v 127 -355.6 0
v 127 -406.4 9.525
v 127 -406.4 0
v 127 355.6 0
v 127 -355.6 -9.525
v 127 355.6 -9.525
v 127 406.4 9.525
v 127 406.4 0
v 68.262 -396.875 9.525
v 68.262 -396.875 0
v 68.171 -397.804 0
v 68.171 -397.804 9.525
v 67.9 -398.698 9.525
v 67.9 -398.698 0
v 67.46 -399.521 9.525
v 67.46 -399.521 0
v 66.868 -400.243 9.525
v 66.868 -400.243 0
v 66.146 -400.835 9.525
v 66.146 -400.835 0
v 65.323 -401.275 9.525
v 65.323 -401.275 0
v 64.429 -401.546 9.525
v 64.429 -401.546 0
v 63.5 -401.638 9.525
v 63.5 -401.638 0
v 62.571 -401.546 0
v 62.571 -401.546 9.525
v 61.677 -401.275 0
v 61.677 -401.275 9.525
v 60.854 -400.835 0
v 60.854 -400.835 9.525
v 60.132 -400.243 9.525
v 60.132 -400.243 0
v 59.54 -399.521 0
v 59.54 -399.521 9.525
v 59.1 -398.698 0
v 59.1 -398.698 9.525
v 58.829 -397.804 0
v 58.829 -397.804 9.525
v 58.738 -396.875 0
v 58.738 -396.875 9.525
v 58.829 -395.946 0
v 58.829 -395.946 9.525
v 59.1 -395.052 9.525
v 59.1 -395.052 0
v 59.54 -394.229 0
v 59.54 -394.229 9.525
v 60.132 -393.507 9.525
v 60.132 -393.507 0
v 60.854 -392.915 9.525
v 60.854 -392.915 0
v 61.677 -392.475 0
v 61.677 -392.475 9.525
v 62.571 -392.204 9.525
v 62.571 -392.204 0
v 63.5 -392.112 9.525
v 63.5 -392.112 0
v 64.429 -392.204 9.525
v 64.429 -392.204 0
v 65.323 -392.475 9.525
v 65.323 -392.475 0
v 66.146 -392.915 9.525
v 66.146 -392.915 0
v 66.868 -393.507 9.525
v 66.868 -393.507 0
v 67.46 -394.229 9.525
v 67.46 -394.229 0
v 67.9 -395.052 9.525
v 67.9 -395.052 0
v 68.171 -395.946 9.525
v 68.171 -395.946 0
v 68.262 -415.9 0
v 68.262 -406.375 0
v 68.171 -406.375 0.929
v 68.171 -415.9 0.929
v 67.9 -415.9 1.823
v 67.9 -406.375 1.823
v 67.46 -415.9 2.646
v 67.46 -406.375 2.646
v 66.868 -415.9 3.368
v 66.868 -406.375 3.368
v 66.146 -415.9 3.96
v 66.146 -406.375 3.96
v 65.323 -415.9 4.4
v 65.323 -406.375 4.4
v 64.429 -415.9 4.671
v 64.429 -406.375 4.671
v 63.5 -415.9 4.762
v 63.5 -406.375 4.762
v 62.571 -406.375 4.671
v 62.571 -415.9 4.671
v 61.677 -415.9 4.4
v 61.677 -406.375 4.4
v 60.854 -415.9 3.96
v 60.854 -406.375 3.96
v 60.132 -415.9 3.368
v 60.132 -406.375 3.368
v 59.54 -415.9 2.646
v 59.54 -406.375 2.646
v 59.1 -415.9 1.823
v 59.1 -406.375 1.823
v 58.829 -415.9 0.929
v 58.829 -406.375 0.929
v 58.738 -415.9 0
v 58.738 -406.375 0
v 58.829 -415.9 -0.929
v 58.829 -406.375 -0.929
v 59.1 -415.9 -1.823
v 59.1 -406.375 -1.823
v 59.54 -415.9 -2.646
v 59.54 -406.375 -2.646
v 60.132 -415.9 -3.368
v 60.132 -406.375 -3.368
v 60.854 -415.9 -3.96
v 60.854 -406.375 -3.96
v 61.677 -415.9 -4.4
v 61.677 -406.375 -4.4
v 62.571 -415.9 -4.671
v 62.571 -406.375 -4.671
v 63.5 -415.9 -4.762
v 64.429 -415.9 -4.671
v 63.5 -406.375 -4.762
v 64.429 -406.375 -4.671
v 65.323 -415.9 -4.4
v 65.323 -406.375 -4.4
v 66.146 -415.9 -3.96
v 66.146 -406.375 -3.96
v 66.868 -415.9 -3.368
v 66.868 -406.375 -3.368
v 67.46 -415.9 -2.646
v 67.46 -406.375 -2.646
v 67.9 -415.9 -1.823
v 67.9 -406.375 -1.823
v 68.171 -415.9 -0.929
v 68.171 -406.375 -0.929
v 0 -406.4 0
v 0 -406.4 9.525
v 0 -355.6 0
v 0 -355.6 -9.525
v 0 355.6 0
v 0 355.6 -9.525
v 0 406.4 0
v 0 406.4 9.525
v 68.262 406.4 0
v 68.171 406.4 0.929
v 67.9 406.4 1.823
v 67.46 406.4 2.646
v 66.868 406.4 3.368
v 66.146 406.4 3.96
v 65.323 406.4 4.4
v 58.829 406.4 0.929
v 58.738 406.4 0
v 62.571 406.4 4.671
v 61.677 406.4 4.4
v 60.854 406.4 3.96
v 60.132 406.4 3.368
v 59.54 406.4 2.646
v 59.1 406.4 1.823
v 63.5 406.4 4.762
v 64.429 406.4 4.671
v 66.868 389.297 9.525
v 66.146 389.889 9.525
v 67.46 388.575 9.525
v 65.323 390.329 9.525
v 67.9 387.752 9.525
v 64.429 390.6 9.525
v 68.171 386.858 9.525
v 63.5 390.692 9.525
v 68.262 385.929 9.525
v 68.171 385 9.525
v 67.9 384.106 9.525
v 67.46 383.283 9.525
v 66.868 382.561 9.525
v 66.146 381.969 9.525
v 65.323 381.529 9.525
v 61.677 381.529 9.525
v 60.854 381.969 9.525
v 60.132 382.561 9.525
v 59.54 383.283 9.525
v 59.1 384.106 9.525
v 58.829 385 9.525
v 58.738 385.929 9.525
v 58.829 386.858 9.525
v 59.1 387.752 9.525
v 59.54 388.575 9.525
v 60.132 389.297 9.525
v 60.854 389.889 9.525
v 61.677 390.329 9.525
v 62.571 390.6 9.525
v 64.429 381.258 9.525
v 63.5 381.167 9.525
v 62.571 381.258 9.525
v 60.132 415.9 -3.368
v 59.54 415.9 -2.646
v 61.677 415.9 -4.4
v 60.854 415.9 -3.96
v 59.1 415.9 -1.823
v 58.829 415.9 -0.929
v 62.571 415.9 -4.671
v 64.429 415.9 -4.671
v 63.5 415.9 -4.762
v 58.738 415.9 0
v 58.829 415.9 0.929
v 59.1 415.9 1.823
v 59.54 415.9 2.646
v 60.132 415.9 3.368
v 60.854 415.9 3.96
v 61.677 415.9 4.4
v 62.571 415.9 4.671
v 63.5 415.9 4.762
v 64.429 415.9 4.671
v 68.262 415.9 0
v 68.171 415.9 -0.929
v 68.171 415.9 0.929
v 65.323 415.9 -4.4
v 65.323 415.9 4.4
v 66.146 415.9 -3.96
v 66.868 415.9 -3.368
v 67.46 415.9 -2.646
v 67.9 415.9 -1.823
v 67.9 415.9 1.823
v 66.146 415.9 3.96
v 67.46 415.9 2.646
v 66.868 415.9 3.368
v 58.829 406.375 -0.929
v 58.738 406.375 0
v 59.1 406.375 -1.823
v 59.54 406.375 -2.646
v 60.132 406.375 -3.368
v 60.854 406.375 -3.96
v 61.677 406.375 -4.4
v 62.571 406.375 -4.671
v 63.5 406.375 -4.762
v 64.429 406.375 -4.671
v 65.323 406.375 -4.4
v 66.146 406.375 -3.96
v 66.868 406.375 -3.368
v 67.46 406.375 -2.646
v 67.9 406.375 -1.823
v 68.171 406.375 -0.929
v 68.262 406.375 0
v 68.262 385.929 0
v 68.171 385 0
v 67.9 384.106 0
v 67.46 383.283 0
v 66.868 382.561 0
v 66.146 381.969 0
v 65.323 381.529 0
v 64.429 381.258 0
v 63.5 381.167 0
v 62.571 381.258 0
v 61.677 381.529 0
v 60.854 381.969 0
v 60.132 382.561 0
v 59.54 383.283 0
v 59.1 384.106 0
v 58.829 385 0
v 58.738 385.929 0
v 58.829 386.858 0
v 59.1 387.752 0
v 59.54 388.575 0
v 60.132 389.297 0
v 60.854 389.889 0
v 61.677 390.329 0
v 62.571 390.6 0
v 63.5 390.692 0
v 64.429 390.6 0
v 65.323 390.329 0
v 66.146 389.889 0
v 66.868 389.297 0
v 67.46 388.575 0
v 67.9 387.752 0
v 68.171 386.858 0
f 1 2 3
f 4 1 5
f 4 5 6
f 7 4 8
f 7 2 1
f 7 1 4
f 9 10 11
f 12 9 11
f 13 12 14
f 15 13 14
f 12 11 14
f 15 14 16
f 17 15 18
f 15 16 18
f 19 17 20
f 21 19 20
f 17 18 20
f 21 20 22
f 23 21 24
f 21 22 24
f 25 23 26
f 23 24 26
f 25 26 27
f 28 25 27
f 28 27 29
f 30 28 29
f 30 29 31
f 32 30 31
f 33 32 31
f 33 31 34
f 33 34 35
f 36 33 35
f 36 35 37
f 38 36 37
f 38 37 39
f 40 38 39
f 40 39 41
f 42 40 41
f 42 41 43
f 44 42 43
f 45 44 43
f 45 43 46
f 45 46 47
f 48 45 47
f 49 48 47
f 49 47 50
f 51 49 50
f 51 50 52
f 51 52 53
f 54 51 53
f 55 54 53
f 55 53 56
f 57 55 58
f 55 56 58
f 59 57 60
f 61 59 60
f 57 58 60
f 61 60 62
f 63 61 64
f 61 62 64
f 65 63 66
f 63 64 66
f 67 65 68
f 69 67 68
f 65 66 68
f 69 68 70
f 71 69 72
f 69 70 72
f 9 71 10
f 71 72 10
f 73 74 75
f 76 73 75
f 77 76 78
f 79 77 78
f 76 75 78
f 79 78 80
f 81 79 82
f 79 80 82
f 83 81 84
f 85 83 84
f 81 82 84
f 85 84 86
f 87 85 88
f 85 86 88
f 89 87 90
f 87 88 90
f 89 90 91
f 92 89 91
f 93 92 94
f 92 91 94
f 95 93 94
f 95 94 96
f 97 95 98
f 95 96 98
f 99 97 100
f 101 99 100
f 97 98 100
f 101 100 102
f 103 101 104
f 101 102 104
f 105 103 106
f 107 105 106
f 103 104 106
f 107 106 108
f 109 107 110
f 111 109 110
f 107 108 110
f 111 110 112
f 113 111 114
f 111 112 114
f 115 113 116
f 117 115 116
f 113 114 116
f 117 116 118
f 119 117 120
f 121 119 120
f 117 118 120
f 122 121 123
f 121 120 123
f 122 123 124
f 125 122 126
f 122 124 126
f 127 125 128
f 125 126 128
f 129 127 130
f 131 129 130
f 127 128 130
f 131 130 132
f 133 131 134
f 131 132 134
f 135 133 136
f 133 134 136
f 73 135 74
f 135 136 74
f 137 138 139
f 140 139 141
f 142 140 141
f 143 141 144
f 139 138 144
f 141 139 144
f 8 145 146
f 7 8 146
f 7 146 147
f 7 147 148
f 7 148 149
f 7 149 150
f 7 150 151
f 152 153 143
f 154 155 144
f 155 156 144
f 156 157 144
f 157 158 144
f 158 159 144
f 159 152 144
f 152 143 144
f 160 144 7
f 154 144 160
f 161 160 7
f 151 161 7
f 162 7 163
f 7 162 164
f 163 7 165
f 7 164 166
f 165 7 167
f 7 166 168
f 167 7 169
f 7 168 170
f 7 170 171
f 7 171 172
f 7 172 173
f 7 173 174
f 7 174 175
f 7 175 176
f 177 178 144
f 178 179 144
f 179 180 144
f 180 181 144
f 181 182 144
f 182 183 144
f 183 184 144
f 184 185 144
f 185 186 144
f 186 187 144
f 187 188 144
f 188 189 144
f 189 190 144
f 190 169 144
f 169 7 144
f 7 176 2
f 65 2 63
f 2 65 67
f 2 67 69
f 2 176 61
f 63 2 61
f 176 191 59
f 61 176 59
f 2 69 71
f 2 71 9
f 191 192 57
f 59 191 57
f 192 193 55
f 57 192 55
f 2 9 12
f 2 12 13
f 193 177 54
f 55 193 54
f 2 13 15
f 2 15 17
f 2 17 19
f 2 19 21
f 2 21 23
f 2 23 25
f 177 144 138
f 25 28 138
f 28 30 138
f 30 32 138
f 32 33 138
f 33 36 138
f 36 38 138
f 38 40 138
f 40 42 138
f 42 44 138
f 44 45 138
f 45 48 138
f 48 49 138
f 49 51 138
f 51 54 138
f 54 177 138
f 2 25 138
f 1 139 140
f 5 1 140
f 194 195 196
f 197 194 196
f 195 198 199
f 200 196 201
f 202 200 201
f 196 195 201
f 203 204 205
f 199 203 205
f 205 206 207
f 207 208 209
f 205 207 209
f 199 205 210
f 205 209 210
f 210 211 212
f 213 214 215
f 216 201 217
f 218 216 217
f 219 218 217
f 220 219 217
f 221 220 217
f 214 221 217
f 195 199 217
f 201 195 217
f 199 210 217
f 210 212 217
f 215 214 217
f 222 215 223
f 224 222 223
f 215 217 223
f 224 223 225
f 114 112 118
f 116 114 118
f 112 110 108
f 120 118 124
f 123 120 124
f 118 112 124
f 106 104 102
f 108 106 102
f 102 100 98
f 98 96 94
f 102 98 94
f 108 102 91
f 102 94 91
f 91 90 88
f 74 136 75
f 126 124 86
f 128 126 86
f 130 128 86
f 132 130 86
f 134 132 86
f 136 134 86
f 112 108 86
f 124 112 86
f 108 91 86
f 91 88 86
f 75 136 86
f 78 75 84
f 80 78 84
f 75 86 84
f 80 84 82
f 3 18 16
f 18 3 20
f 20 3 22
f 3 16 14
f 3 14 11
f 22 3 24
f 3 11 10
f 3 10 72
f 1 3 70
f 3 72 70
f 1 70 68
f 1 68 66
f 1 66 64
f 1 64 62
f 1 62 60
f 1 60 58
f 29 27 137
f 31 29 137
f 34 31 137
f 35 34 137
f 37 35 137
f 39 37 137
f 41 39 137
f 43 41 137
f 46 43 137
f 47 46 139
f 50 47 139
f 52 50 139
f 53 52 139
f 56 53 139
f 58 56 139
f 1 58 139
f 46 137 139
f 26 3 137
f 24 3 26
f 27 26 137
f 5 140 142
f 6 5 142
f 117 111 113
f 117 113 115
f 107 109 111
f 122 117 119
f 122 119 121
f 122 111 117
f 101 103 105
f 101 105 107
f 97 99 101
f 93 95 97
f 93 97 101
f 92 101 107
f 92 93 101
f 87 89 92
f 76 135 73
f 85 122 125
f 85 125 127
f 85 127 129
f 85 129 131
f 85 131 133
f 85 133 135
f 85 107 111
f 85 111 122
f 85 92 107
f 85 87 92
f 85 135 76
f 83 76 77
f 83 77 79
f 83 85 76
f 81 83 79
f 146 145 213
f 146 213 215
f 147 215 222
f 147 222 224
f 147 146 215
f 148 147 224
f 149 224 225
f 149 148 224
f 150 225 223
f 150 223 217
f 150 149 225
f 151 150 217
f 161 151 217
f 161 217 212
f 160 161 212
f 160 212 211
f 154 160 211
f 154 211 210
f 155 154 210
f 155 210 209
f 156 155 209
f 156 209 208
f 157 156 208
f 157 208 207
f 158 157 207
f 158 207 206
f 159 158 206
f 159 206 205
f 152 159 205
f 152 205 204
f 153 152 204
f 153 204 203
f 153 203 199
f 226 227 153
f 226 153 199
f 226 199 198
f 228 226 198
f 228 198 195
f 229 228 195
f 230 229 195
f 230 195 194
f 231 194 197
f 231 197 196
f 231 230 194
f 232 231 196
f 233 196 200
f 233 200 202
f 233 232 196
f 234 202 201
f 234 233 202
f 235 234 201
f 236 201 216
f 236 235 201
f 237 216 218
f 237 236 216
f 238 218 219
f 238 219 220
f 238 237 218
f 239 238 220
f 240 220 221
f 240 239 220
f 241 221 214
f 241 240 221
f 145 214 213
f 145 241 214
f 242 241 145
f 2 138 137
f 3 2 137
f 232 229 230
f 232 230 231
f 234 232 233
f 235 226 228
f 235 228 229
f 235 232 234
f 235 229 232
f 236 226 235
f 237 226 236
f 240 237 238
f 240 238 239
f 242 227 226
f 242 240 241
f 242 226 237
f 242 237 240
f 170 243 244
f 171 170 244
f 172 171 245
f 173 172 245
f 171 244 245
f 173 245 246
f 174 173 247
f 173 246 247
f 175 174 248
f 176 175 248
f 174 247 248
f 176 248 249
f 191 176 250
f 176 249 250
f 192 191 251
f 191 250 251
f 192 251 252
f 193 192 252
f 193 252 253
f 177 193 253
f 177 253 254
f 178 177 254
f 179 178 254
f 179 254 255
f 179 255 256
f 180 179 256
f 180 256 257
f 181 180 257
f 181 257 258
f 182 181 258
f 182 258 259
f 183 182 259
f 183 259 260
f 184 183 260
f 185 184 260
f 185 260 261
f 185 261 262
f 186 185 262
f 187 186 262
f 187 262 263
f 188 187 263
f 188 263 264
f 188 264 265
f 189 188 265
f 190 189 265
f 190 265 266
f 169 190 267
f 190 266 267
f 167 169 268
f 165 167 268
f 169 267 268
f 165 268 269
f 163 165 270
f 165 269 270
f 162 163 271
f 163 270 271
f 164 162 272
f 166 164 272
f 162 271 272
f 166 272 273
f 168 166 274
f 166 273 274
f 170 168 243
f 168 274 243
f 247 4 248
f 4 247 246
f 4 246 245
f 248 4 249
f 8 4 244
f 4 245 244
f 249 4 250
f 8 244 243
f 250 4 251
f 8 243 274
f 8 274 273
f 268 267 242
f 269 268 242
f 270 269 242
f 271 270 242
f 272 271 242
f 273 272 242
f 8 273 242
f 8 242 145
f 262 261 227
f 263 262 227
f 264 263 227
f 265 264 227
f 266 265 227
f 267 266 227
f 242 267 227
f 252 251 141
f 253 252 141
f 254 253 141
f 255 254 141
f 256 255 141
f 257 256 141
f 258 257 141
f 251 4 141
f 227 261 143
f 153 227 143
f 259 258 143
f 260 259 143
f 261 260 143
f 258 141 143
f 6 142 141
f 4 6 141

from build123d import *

# Parameters (mm, degrees)
F1_DEPTH = 127
F2_R     = 4.7625
F3_DEPTH = 25.4
F5_R     = 4.7625
F6_DEPTH = 9.525
F8_R     = 4.7625
F9_DEPTH = 9.525


with BuildPart() as f1:
    # F0 (on Right) → F1 (new body)
    with BuildSketch(Plane.YZ):
        Polygon((-355.6, 0), (-355.6, -9.525), (355.6, -9.525), (355.6, 0), (406.4, 0), (406.4, 9.525), (-406.4, 9.525), (-406.4, 0), align=None)
    extrude(amount=F1_DEPTH)

    # F2 (on face) → F3 (cut)
    with BuildSketch(Plane(origin=(0, 0, -9.525), x_dir=(1, 0, 0), z_dir=(0, 0, -1))):
        with Locations((63.5, -385.929012)):
            Circle(F2_R)
        with Locations((63.5, 396.875)):
            Circle(F2_R)
    extrude(amount=-F3_DEPTH, mode=Mode.SUBTRACT)

    # F8 (on offset) → F9 (join)
    with BuildSketch(Plane.XZ.offset(-406.3746)):
        with Locations((63.5, 0)):
            Circle(F8_R)
    extrude(amount=-F9_DEPTH)


with BuildPart() as f6:
    # F5 (on offset) → F6 (new body)
    with BuildSketch(Plane.XZ.offset(406.3746)):
        with Locations((63.5, 0)):
            Circle(F5_R)
    extrude(amount=F6_DEPTH)


solid = Compound([f1.part, f6.part])
